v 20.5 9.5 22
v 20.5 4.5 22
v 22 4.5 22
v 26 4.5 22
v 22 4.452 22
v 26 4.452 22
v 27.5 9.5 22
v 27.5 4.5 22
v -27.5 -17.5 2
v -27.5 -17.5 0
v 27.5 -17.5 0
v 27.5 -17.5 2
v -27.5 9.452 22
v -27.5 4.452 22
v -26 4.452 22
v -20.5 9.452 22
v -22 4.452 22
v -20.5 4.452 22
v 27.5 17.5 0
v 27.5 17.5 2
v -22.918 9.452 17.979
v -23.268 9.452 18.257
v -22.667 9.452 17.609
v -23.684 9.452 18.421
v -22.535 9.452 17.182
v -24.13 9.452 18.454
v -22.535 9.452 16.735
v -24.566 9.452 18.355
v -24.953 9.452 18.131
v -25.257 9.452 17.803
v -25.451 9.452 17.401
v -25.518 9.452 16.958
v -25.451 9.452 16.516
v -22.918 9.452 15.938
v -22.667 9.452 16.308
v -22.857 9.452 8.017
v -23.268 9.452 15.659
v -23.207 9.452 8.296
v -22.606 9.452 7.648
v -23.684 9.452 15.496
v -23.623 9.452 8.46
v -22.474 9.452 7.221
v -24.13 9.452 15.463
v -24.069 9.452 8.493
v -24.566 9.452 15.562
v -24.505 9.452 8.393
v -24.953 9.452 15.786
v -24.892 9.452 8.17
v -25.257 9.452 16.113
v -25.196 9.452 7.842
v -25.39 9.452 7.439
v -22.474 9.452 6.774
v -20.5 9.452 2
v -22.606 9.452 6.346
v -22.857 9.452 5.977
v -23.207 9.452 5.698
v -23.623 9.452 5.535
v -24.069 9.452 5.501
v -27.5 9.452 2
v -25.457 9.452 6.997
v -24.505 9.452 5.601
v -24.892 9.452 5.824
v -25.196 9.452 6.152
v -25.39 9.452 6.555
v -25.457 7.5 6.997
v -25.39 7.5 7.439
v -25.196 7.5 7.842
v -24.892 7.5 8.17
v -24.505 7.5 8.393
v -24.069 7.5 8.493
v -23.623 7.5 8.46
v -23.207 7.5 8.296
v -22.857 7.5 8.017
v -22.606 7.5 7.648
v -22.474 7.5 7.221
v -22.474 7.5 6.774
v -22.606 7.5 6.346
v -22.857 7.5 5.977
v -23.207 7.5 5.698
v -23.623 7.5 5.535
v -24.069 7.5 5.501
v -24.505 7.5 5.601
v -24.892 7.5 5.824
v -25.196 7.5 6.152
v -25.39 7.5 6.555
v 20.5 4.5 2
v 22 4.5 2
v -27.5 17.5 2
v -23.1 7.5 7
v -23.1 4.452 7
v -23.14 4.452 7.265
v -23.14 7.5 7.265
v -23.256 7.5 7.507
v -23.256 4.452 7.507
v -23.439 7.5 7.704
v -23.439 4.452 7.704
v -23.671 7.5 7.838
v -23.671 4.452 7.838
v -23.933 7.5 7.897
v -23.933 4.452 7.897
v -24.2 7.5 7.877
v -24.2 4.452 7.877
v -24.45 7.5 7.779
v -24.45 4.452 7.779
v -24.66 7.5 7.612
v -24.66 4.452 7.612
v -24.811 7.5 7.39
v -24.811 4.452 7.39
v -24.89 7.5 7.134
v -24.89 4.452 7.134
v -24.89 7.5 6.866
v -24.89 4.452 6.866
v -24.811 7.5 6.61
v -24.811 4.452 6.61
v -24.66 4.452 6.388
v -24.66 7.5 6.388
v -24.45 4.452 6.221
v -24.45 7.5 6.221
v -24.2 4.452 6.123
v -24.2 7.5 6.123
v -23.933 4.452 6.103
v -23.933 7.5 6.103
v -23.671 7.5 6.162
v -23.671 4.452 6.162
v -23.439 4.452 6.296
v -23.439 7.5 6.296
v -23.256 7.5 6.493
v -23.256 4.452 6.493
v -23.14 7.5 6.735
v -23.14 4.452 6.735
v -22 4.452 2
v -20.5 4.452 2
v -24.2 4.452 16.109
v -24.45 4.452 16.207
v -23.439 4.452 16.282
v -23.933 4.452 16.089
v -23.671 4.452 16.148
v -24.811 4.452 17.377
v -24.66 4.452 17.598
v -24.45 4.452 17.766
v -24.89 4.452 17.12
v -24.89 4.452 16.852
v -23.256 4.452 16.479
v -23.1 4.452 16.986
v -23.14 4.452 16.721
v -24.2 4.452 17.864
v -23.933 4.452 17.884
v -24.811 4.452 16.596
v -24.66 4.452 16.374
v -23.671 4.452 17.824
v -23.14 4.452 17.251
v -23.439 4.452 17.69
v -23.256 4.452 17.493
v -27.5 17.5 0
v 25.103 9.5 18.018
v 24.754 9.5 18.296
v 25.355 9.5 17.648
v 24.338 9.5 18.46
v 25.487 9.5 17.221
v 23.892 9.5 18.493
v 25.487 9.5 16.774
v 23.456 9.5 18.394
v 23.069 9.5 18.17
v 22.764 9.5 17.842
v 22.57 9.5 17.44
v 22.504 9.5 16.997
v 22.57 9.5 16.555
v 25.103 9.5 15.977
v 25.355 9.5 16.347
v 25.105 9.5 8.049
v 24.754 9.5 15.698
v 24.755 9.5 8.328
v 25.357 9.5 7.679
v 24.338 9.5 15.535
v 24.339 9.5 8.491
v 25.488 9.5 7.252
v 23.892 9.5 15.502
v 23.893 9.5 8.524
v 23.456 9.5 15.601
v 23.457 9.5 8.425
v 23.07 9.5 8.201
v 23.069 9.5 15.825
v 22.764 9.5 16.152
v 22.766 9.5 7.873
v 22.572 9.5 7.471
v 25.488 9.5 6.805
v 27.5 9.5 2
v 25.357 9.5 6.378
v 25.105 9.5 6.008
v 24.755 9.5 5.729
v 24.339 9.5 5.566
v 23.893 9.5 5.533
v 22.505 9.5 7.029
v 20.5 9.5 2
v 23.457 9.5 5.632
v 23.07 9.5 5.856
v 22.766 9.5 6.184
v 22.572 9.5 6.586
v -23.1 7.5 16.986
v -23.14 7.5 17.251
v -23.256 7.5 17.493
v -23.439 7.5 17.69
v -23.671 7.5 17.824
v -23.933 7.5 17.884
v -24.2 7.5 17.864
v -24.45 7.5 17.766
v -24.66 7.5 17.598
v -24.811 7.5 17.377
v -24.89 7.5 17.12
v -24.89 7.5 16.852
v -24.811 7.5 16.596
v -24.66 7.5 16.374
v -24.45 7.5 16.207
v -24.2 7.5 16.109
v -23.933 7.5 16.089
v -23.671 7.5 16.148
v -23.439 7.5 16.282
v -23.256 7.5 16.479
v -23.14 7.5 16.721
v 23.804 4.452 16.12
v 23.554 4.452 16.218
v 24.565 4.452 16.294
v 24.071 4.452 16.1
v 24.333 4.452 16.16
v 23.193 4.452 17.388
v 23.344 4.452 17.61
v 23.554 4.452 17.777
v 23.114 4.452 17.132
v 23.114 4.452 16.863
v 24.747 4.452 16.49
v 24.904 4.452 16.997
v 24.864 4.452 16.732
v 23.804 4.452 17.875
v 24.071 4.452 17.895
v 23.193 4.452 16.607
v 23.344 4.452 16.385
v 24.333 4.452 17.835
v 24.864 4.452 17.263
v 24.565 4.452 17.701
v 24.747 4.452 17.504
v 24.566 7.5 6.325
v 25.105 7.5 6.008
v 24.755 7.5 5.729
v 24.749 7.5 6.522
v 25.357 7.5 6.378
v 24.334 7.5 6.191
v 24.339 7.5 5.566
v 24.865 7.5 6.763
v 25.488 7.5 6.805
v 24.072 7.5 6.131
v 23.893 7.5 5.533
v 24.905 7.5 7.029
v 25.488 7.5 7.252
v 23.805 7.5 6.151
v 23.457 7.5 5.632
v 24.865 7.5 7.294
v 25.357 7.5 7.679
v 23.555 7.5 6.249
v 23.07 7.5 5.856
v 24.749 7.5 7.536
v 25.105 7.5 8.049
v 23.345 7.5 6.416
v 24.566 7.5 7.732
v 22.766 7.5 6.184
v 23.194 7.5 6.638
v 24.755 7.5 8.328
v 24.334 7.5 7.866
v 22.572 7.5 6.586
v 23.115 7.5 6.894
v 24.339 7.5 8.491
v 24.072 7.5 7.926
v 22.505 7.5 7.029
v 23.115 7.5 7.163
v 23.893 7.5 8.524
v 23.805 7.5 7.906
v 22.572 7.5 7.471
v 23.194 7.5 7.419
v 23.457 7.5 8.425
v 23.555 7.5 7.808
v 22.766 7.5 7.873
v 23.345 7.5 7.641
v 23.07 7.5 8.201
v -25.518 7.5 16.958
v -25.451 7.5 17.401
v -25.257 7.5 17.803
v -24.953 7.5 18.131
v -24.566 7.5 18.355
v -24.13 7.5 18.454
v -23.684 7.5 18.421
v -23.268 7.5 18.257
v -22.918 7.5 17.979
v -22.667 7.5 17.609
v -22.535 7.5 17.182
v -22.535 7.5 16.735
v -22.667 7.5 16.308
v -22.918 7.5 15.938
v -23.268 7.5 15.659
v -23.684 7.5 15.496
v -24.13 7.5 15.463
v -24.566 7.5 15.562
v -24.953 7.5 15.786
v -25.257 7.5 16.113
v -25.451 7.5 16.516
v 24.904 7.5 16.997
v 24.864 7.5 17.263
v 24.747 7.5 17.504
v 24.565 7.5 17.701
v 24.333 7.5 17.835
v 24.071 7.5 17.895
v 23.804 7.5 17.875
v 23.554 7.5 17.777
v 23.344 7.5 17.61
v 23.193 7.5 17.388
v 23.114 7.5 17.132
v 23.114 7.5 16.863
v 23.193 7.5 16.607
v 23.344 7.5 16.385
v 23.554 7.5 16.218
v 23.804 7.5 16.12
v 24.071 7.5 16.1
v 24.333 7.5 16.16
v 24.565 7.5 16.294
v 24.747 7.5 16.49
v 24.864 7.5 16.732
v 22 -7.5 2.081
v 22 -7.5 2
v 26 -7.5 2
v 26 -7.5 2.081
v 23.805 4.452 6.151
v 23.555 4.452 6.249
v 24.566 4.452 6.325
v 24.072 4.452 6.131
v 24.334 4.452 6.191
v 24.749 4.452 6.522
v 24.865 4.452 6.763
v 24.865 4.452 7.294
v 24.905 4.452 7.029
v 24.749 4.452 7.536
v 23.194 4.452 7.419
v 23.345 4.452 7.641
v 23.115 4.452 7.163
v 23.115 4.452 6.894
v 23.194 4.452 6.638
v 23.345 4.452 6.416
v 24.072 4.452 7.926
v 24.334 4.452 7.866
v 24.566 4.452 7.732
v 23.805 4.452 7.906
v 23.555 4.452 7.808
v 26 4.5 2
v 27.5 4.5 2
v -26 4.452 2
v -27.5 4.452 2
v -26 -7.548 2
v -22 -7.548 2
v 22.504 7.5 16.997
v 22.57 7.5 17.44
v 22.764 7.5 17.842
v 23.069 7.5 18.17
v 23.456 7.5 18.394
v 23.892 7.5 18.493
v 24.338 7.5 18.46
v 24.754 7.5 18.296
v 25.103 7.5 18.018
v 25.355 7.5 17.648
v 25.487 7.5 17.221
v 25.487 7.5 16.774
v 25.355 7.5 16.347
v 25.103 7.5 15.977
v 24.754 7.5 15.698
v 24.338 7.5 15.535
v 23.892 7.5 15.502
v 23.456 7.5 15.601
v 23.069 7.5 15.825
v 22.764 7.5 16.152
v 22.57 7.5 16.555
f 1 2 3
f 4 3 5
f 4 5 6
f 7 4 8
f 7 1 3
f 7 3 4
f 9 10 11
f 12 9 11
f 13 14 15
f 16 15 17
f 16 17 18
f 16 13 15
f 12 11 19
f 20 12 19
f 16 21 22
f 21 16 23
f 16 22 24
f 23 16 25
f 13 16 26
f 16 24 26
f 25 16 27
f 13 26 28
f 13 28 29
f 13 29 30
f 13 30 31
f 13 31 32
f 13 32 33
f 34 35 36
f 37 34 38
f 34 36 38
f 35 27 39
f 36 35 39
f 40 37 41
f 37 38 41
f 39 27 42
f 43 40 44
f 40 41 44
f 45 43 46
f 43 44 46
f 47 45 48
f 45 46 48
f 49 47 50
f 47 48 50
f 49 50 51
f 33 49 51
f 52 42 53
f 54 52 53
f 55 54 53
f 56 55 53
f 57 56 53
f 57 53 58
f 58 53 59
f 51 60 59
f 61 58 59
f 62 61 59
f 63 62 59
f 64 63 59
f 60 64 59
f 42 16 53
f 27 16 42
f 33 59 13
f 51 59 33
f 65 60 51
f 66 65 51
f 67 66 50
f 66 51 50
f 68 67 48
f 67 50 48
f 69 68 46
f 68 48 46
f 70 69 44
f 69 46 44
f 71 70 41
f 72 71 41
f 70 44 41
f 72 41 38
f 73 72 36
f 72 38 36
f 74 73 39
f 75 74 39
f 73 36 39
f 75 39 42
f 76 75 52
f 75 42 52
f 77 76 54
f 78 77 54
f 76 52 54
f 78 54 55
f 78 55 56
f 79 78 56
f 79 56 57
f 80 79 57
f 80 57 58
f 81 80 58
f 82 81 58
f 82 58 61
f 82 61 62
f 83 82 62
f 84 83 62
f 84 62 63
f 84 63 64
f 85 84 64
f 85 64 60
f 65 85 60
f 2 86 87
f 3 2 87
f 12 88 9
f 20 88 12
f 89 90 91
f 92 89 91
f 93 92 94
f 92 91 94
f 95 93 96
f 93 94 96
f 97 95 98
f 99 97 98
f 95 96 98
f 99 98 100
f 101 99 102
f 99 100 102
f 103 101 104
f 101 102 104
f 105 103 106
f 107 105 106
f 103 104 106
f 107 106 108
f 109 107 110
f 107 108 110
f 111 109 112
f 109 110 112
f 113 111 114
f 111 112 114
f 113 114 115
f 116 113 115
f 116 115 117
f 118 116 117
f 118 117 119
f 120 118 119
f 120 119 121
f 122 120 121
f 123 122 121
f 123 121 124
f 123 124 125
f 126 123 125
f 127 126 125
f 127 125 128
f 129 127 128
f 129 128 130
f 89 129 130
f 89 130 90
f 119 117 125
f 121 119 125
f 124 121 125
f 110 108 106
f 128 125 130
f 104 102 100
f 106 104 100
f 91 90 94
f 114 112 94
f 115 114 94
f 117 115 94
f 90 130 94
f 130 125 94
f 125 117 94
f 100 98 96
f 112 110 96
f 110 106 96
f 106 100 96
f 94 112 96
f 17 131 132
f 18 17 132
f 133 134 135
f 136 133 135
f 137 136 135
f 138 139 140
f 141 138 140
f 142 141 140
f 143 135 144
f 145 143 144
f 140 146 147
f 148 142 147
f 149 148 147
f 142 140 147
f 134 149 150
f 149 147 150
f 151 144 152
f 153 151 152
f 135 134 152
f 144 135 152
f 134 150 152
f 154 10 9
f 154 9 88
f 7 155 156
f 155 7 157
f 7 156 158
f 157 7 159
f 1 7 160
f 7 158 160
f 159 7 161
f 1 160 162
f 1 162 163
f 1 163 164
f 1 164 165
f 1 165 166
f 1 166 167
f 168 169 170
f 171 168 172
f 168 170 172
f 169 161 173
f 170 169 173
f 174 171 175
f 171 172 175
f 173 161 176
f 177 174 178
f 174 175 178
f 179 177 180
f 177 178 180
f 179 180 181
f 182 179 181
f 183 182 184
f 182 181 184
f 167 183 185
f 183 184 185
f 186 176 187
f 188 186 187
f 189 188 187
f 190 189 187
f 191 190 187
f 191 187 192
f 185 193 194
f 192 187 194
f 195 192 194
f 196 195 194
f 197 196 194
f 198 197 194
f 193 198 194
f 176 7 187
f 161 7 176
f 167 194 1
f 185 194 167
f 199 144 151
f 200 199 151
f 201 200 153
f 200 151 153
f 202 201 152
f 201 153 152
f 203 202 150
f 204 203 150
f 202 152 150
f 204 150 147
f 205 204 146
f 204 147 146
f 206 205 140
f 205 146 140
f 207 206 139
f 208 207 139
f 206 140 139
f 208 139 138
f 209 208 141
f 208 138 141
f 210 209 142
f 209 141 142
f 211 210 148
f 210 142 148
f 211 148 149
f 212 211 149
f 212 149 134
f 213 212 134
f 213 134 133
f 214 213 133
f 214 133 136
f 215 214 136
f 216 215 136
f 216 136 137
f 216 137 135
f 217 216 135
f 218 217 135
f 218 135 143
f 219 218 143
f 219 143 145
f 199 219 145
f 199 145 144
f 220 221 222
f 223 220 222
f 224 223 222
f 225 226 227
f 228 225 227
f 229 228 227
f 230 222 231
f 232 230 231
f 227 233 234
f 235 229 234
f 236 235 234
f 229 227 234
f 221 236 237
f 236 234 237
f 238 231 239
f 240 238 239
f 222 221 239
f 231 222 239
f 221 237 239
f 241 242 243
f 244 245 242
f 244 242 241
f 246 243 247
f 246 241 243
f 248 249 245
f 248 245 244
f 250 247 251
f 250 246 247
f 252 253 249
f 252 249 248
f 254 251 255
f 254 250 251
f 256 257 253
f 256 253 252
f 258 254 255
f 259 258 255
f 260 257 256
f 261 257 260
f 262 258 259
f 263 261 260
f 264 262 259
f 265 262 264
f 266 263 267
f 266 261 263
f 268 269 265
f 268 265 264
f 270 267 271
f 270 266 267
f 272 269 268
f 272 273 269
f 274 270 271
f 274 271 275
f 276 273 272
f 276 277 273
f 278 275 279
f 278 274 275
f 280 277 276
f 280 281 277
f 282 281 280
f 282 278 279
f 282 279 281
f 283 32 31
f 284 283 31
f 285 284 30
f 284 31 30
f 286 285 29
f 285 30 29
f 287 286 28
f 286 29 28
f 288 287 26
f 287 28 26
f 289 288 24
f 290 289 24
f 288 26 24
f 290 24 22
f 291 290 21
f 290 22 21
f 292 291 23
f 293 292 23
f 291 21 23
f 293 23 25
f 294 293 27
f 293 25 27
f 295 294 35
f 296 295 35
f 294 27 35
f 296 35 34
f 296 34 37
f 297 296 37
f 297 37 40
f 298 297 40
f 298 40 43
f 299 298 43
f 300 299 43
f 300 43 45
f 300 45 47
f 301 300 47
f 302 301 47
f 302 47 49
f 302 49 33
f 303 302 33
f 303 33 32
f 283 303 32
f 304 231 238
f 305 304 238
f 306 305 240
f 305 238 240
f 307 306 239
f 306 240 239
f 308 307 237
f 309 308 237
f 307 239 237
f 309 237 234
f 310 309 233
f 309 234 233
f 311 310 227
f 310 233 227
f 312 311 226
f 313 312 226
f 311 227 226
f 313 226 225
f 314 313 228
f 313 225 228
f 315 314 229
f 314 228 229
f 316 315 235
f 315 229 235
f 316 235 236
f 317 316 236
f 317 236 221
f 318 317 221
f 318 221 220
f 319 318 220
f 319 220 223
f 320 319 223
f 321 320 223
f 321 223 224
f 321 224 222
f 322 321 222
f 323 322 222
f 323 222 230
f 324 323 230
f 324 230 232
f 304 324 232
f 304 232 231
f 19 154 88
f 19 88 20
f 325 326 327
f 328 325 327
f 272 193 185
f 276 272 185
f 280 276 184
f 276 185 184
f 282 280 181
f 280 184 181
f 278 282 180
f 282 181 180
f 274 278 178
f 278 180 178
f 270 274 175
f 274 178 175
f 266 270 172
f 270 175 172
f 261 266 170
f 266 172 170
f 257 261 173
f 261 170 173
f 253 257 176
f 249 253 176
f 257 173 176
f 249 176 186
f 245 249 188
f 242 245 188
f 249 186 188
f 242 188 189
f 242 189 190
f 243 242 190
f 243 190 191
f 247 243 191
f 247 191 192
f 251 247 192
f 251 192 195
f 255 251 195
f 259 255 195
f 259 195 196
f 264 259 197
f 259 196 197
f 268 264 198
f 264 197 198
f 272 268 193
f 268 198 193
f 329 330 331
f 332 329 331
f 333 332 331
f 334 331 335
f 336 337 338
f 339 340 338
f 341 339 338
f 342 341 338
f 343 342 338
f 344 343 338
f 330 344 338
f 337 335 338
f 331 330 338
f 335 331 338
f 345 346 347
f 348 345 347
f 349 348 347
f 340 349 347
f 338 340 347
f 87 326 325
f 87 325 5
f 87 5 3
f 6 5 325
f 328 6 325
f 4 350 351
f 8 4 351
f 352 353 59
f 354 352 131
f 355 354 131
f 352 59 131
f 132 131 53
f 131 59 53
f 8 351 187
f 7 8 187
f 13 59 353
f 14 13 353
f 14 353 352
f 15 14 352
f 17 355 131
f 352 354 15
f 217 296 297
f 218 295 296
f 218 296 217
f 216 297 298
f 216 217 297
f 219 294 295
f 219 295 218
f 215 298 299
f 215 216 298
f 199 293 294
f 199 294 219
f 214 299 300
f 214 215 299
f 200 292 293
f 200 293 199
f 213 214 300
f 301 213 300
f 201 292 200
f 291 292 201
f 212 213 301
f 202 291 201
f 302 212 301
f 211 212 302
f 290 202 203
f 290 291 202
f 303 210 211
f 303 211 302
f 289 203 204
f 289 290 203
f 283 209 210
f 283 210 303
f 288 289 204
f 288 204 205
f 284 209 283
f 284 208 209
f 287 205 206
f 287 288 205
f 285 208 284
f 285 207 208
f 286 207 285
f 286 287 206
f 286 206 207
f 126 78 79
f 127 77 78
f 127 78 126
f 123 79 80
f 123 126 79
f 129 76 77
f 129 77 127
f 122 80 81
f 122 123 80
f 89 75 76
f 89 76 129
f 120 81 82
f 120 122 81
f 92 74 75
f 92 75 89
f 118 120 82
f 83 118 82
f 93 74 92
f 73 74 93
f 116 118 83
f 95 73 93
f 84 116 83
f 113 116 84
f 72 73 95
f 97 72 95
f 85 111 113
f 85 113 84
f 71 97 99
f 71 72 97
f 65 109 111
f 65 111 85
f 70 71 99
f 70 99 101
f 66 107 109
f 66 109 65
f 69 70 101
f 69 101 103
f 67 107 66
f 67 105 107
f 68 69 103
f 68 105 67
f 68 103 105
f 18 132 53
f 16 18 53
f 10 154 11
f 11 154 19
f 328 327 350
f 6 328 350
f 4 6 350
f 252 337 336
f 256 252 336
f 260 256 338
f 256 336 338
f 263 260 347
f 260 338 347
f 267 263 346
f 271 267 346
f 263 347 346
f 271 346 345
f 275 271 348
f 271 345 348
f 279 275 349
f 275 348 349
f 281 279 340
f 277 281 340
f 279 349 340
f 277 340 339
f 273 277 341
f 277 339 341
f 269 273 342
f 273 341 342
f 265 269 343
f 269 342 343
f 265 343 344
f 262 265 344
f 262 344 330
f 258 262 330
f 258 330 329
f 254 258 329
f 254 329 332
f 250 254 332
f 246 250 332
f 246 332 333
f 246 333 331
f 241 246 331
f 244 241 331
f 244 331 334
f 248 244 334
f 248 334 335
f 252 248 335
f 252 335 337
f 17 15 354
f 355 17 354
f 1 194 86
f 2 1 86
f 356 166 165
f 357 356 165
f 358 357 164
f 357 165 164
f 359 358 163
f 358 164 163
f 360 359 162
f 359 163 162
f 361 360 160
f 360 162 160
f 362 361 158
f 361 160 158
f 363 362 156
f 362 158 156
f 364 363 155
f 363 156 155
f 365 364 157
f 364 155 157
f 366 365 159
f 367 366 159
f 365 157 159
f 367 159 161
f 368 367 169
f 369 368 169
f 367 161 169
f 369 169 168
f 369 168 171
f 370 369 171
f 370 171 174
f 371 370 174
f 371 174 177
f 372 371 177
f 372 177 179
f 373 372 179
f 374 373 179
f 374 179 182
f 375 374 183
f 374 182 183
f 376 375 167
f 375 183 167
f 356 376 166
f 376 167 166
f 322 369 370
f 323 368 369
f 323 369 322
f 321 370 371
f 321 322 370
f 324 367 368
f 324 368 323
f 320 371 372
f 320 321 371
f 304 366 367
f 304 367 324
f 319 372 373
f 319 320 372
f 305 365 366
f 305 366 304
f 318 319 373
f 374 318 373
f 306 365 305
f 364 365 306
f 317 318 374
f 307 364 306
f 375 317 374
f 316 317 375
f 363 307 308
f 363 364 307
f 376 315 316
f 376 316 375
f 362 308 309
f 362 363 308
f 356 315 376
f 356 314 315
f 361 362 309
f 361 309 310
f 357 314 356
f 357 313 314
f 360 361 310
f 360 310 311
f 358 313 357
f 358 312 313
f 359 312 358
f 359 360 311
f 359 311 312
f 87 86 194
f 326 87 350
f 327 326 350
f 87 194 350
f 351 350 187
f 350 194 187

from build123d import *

# Parameters (mm, degrees)
F0_W      = 55
F0_H      = 35
F1_DEPTH  = 2
F3_W      = 4
F3_H      = 12
F4_DEPTH  = 20
F6_R      = 0.9
F7_DEPTH  = 7
F8_R      = 1.5
F8_R_2    = 0.9
F9_DEPTH  = 2
F11_DEPTH = 55


with BuildPart() as f1:
    # F0 (on Top) → F1 (new body)
    with BuildSketch(Plane.XY):
        Rectangle(F0_W, F0_H)
    extrude(amount=F1_DEPTH)


with BuildPart() as f4:
    # F3 (on face) → F4 (new body)
    with BuildSketch(Plane.XY.offset(2)):
        Polygon((-27.5, 9.45168), (-27.5, 4.45168), (-26, 4.45168), (-22, 4.45168), (-20.5, 4.45168), (-20.5, 9.45168), align=None)
        Polygon((27.5, 9.5), (20.5, 9.5), (20.5, 4.5), (22, 4.5), (26, 4.5), (27.5, 4.5), align=None)
        with Locations((-24, -1.54832)):
            Rectangle(F3_W, F3_H)
        with Locations((24, -1.5)):
            Rectangle(F3_W, F3_H)
    extrude(amount=F4_DEPTH)

    # F6 (on face) → F7 (cut)
    with BuildSketch(Plane.XZ.offset(-4.45168)):
        with Locations((-24, 16.986096)):
            Circle(F6_R)
        with Locations((-24, 7)):
            Circle(F6_R)
        with Locations((24.003841, 16.997389)):
            Circle(F6_R)
        with Locations((24.005156, 7.028514)):
            Circle(F6_R)
    extrude(amount=-F7_DEPTH, mode=Mode.SUBTRACT)

    # F8 (on face) → F9 (cut)
    with BuildSketch(Plane(origin=(0, 9.5, 0), x_dir=(-1, 0, 0), z_dir=(0, 1, 0))):
        with Locations((-24.003841, 16.997389)):
            Circle(F8_R)
        with Locations((-24.003841, 16.997389)):
            Circle(F8_R_2, mode=Mode.SUBTRACT)
        with Locations((-24.005156, 7.028514)):
            Circle(F8_R)
        with Locations((-24.005156, 7.028514)):
            Circle(F8_R_2, mode=Mode.SUBTRACT)
        with Locations((24.018068, 16.958425)):
            Circle(F8_R)
        with Locations((23.956954, 6.99716)):
            Circle(F8_R)
    extrude(amount=-F9_DEPTH, mode=Mode.SUBTRACT)

    # F10 (on face) → F11 (cut)
    with BuildSketch(Plane(origin=(-26, 0, 0), x_dir=(0, -1, 0), z_dir=(-1, 0, 0))):
        Polygon((-4.45168, 22), (7.54832, 2), (7.54832, 22), align=None)
    extrude(amount=-F11_DEPTH, mode=Mode.SUBTRACT)


solid = Compound([f1.part, f4.part])
